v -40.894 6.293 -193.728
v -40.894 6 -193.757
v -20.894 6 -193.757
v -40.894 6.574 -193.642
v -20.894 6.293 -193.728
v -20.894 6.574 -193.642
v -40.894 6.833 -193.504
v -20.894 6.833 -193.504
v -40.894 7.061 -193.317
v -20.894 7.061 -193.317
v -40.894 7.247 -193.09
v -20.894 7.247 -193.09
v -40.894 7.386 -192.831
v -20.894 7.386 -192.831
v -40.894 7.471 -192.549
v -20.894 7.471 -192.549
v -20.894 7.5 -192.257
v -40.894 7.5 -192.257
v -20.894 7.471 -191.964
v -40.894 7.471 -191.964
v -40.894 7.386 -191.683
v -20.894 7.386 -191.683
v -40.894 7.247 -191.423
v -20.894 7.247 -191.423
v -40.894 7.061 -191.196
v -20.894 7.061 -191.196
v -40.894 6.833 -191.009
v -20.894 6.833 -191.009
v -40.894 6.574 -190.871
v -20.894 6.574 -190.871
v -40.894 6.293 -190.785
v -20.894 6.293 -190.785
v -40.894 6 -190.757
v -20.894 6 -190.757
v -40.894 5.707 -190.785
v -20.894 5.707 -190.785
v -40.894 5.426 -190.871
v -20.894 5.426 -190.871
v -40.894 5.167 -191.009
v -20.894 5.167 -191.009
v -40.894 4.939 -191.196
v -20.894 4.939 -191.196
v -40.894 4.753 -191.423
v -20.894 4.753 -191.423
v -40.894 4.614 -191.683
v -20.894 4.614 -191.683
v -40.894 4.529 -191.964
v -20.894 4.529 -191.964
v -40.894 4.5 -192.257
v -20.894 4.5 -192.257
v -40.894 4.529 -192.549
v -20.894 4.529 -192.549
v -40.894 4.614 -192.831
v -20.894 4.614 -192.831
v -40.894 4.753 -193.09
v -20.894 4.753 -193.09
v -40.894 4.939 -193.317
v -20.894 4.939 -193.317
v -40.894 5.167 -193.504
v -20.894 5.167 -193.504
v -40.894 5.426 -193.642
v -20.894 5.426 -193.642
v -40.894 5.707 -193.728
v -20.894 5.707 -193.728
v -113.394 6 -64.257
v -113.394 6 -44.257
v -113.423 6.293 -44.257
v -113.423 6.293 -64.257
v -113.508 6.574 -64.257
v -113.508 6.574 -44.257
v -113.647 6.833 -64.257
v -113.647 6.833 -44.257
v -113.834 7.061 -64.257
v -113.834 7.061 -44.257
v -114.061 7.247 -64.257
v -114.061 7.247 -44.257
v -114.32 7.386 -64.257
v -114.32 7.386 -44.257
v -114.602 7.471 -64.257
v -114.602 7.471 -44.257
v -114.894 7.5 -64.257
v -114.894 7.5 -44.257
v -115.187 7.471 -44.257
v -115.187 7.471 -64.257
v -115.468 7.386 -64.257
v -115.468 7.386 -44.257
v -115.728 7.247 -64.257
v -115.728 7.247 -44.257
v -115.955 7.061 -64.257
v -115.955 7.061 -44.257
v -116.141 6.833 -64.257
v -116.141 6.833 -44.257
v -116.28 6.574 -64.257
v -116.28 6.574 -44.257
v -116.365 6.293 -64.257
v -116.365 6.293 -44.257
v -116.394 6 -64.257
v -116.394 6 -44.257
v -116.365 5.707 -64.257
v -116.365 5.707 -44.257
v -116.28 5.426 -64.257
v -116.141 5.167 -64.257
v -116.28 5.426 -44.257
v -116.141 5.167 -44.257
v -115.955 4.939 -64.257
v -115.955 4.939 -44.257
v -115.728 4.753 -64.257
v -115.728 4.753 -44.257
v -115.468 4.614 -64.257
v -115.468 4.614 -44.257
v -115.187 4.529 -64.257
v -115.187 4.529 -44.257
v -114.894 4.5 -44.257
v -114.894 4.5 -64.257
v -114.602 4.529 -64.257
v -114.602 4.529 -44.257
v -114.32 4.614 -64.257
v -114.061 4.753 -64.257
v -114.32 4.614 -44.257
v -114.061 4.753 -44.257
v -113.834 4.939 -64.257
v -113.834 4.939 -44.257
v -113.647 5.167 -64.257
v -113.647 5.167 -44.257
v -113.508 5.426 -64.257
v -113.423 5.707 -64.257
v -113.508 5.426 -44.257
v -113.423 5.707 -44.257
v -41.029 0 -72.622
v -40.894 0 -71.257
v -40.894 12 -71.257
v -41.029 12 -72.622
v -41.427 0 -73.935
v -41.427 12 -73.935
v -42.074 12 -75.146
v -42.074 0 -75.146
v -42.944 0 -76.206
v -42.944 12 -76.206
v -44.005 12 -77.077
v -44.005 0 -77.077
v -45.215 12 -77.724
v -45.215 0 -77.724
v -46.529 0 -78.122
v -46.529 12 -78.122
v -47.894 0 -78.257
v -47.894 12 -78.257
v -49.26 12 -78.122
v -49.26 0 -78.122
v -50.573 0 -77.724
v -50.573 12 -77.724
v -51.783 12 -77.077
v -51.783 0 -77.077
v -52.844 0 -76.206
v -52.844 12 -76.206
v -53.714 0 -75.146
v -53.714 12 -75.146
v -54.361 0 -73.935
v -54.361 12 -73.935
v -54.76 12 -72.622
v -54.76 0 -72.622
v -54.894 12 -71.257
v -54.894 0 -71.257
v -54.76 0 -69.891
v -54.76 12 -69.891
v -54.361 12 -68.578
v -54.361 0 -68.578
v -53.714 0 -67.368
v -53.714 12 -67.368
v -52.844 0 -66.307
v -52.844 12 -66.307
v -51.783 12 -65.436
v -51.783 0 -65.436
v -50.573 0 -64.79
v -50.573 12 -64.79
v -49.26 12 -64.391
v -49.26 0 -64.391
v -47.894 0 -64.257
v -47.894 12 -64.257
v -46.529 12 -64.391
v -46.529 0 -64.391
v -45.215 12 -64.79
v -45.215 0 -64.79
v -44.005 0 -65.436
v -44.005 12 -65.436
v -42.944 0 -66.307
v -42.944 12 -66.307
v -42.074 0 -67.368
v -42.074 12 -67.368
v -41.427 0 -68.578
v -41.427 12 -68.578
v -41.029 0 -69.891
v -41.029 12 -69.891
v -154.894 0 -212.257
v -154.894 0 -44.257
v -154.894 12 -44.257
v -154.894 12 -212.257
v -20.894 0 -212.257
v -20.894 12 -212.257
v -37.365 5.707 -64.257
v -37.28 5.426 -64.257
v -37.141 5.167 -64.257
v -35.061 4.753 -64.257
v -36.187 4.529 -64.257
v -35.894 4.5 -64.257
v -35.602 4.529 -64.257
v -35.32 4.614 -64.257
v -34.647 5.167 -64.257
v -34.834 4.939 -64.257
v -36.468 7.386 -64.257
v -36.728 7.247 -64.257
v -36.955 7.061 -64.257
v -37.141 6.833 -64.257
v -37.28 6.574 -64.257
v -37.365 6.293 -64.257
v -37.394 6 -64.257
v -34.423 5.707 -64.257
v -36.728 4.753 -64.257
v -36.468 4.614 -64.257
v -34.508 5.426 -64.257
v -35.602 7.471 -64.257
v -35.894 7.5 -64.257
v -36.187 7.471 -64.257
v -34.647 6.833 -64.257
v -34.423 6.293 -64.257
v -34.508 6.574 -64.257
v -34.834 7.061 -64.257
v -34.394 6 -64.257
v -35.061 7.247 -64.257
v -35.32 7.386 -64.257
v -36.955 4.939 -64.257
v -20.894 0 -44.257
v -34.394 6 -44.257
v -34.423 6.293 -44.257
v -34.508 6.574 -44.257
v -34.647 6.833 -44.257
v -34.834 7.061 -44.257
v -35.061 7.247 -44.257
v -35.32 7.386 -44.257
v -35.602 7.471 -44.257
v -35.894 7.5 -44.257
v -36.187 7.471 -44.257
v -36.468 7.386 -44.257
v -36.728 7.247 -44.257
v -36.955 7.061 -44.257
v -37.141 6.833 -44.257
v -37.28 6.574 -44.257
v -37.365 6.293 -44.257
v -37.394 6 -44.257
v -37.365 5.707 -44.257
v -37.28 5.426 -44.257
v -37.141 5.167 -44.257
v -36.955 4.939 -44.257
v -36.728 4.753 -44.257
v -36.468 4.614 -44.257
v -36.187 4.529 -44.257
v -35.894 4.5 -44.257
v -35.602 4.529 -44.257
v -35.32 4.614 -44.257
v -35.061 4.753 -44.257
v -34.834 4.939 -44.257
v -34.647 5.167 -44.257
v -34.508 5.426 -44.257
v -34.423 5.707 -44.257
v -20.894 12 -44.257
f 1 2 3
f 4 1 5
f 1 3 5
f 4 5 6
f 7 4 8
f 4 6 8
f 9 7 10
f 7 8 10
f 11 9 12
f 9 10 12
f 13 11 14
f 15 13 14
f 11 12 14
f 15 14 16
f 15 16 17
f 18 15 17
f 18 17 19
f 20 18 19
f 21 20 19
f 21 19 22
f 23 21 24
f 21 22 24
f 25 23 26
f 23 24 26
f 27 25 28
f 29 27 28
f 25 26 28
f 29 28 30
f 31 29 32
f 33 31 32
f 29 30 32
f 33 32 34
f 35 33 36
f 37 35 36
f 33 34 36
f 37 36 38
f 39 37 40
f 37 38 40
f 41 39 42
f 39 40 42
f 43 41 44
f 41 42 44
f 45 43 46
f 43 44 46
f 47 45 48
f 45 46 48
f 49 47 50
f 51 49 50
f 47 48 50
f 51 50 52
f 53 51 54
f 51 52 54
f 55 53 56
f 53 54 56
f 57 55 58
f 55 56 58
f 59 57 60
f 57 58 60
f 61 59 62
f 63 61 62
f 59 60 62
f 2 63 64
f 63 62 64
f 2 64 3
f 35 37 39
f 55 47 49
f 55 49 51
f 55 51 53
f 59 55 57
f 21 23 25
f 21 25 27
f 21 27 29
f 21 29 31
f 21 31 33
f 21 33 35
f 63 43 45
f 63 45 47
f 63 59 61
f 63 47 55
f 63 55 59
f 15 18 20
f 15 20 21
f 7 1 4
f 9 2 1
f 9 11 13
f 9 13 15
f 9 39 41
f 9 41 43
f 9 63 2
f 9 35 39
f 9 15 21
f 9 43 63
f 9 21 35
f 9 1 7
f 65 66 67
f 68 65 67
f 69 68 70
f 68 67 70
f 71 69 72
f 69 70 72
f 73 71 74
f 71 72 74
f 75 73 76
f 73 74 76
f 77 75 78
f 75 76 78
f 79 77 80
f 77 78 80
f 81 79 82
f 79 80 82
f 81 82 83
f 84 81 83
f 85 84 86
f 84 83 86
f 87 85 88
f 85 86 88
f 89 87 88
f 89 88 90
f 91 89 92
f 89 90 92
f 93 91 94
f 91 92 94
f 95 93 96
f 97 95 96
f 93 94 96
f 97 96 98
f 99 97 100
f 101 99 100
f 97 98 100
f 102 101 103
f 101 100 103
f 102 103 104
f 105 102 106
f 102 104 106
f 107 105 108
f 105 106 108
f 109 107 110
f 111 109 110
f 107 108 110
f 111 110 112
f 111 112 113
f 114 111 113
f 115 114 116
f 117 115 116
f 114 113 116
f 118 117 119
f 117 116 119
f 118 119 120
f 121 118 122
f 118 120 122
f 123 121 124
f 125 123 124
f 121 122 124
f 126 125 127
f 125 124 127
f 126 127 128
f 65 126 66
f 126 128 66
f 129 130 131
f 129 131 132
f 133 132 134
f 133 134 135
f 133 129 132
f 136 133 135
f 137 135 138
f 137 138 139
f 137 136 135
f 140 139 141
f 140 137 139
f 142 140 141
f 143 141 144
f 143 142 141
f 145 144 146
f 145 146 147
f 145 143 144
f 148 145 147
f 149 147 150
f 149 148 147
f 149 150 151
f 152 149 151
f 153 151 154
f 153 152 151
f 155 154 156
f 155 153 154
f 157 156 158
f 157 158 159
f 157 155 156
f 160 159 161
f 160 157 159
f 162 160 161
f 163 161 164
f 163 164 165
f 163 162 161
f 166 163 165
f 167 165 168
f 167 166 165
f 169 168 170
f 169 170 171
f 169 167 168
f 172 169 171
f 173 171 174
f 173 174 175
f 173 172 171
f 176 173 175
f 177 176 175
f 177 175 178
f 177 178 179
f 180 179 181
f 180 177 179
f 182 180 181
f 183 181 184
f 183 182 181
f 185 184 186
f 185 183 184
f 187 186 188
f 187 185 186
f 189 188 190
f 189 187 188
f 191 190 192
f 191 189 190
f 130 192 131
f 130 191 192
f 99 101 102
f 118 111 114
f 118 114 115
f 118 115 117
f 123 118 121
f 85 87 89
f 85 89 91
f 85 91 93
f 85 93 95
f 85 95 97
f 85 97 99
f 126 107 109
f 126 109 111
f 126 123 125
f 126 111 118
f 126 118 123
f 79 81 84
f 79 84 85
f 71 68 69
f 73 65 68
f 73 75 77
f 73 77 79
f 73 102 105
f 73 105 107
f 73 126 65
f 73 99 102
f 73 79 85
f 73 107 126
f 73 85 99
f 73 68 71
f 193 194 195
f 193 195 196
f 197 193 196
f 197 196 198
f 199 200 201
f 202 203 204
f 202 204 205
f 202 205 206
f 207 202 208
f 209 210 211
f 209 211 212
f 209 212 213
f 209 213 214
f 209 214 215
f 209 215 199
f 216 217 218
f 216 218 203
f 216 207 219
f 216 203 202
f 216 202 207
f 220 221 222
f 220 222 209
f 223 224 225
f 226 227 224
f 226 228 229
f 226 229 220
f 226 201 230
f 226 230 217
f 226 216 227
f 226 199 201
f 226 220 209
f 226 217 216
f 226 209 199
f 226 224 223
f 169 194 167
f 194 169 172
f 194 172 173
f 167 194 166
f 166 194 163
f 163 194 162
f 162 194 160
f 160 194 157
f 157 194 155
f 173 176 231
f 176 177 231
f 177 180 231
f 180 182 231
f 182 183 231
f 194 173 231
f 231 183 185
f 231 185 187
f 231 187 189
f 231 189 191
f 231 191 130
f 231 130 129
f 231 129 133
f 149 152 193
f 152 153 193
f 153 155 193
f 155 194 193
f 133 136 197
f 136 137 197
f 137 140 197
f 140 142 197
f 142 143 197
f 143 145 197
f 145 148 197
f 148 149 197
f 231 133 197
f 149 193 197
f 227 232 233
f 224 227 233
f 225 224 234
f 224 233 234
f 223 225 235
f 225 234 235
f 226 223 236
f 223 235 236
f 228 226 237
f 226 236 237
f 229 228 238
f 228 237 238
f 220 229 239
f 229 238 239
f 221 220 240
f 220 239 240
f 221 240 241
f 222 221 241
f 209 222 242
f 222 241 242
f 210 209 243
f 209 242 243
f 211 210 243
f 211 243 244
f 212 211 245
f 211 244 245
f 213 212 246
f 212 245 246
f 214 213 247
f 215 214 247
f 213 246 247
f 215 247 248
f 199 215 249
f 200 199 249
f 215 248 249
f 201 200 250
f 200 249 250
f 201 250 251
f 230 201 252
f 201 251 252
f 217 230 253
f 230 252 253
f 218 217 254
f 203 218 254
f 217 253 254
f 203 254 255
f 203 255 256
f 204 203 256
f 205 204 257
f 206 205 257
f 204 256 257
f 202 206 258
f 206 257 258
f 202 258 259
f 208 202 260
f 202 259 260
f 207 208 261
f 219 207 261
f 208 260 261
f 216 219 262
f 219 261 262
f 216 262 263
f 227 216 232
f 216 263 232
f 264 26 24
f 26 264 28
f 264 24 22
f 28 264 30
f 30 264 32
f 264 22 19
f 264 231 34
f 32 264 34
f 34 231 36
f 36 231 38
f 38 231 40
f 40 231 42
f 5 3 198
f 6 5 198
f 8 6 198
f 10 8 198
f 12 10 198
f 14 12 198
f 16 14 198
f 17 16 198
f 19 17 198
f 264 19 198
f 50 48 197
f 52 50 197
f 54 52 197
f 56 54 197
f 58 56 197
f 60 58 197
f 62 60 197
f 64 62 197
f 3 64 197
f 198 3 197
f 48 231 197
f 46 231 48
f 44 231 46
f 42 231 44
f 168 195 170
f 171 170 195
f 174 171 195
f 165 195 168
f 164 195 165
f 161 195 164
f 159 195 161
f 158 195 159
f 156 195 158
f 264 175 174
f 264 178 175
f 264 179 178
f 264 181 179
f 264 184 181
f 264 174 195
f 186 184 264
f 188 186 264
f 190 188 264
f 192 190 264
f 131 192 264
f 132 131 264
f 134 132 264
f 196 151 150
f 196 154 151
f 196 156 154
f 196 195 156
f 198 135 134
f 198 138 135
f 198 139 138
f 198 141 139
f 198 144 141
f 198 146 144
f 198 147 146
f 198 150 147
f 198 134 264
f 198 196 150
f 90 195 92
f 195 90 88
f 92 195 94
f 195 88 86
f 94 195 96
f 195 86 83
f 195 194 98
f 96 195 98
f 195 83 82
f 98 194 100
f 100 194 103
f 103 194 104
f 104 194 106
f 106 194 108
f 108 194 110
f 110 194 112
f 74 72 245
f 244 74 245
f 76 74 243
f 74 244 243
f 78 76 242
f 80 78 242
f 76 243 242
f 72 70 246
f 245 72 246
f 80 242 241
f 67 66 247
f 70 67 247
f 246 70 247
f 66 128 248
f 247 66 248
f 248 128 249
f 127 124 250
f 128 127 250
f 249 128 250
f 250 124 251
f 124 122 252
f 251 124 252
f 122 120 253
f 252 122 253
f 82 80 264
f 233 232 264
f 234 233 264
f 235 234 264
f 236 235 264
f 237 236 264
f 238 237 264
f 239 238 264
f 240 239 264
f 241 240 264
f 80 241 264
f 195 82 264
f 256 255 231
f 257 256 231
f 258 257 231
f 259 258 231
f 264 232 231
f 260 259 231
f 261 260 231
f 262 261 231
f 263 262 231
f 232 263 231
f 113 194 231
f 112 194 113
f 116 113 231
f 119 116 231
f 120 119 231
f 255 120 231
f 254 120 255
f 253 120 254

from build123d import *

# Parameters (mm, degrees)
SKETCH1_W           = 134
SKETCH1_H           = 168
SKETCH1_R           = 7
BOSS_EXTRUDE1_DEPTH = 12
CUT_EXTRUDE1_START  = -44.256673
SKETCH2_R           = 1.5
CUT_EXTRUDE1_DEPTH  = 20
CUT_EXTRUDE2_START  = -20.894163
SKETCH3_R           = 1.5
CUT_EXTRUDE2_DEPTH  = 20


with BuildPart() as part:
    # Sketch1 → Boss-Extrude1 (new body)
    with BuildSketch(Plane(origin=(0, 0, 0), x_dir=(1, 0, 0), z_dir=(0, 1, 0))):
        with Locations((-87.894163325, 128.256672781)):
            Rectangle(SKETCH1_W, SKETCH1_H)
        with Locations((-47.894163325, 71.256672781)):
            Circle(SKETCH1_R, mode=Mode.SUBTRACT)
    extrude(amount=BOSS_EXTRUDE1_DEPTH)

    # Sketch2 → Cut-Extrude1 (cut)
    with BuildSketch(Plane.XY.offset(CUT_EXTRUDE1_START)):
        with Locations((-114.894163325, 6)):
            Circle(SKETCH2_R)
        with Locations((-35.894163325, 6)):
            Circle(SKETCH2_R)
    extrude(amount=-CUT_EXTRUDE1_DEPTH, mode=Mode.SUBTRACT)

    # Sketch3 → Cut-Extrude2 (cut)
    with BuildSketch(Plane(origin=(0, 0, 0), x_dir=(0, 0, -1), z_dir=(1, 0, 0)).offset(CUT_EXTRUDE2_START)):
        with Locations((192.256672781, 6)):
            Circle(SKETCH3_R)
    extrude(amount=-CUT_EXTRUDE2_DEPTH, mode=Mode.SUBTRACT)


solid = part.part
